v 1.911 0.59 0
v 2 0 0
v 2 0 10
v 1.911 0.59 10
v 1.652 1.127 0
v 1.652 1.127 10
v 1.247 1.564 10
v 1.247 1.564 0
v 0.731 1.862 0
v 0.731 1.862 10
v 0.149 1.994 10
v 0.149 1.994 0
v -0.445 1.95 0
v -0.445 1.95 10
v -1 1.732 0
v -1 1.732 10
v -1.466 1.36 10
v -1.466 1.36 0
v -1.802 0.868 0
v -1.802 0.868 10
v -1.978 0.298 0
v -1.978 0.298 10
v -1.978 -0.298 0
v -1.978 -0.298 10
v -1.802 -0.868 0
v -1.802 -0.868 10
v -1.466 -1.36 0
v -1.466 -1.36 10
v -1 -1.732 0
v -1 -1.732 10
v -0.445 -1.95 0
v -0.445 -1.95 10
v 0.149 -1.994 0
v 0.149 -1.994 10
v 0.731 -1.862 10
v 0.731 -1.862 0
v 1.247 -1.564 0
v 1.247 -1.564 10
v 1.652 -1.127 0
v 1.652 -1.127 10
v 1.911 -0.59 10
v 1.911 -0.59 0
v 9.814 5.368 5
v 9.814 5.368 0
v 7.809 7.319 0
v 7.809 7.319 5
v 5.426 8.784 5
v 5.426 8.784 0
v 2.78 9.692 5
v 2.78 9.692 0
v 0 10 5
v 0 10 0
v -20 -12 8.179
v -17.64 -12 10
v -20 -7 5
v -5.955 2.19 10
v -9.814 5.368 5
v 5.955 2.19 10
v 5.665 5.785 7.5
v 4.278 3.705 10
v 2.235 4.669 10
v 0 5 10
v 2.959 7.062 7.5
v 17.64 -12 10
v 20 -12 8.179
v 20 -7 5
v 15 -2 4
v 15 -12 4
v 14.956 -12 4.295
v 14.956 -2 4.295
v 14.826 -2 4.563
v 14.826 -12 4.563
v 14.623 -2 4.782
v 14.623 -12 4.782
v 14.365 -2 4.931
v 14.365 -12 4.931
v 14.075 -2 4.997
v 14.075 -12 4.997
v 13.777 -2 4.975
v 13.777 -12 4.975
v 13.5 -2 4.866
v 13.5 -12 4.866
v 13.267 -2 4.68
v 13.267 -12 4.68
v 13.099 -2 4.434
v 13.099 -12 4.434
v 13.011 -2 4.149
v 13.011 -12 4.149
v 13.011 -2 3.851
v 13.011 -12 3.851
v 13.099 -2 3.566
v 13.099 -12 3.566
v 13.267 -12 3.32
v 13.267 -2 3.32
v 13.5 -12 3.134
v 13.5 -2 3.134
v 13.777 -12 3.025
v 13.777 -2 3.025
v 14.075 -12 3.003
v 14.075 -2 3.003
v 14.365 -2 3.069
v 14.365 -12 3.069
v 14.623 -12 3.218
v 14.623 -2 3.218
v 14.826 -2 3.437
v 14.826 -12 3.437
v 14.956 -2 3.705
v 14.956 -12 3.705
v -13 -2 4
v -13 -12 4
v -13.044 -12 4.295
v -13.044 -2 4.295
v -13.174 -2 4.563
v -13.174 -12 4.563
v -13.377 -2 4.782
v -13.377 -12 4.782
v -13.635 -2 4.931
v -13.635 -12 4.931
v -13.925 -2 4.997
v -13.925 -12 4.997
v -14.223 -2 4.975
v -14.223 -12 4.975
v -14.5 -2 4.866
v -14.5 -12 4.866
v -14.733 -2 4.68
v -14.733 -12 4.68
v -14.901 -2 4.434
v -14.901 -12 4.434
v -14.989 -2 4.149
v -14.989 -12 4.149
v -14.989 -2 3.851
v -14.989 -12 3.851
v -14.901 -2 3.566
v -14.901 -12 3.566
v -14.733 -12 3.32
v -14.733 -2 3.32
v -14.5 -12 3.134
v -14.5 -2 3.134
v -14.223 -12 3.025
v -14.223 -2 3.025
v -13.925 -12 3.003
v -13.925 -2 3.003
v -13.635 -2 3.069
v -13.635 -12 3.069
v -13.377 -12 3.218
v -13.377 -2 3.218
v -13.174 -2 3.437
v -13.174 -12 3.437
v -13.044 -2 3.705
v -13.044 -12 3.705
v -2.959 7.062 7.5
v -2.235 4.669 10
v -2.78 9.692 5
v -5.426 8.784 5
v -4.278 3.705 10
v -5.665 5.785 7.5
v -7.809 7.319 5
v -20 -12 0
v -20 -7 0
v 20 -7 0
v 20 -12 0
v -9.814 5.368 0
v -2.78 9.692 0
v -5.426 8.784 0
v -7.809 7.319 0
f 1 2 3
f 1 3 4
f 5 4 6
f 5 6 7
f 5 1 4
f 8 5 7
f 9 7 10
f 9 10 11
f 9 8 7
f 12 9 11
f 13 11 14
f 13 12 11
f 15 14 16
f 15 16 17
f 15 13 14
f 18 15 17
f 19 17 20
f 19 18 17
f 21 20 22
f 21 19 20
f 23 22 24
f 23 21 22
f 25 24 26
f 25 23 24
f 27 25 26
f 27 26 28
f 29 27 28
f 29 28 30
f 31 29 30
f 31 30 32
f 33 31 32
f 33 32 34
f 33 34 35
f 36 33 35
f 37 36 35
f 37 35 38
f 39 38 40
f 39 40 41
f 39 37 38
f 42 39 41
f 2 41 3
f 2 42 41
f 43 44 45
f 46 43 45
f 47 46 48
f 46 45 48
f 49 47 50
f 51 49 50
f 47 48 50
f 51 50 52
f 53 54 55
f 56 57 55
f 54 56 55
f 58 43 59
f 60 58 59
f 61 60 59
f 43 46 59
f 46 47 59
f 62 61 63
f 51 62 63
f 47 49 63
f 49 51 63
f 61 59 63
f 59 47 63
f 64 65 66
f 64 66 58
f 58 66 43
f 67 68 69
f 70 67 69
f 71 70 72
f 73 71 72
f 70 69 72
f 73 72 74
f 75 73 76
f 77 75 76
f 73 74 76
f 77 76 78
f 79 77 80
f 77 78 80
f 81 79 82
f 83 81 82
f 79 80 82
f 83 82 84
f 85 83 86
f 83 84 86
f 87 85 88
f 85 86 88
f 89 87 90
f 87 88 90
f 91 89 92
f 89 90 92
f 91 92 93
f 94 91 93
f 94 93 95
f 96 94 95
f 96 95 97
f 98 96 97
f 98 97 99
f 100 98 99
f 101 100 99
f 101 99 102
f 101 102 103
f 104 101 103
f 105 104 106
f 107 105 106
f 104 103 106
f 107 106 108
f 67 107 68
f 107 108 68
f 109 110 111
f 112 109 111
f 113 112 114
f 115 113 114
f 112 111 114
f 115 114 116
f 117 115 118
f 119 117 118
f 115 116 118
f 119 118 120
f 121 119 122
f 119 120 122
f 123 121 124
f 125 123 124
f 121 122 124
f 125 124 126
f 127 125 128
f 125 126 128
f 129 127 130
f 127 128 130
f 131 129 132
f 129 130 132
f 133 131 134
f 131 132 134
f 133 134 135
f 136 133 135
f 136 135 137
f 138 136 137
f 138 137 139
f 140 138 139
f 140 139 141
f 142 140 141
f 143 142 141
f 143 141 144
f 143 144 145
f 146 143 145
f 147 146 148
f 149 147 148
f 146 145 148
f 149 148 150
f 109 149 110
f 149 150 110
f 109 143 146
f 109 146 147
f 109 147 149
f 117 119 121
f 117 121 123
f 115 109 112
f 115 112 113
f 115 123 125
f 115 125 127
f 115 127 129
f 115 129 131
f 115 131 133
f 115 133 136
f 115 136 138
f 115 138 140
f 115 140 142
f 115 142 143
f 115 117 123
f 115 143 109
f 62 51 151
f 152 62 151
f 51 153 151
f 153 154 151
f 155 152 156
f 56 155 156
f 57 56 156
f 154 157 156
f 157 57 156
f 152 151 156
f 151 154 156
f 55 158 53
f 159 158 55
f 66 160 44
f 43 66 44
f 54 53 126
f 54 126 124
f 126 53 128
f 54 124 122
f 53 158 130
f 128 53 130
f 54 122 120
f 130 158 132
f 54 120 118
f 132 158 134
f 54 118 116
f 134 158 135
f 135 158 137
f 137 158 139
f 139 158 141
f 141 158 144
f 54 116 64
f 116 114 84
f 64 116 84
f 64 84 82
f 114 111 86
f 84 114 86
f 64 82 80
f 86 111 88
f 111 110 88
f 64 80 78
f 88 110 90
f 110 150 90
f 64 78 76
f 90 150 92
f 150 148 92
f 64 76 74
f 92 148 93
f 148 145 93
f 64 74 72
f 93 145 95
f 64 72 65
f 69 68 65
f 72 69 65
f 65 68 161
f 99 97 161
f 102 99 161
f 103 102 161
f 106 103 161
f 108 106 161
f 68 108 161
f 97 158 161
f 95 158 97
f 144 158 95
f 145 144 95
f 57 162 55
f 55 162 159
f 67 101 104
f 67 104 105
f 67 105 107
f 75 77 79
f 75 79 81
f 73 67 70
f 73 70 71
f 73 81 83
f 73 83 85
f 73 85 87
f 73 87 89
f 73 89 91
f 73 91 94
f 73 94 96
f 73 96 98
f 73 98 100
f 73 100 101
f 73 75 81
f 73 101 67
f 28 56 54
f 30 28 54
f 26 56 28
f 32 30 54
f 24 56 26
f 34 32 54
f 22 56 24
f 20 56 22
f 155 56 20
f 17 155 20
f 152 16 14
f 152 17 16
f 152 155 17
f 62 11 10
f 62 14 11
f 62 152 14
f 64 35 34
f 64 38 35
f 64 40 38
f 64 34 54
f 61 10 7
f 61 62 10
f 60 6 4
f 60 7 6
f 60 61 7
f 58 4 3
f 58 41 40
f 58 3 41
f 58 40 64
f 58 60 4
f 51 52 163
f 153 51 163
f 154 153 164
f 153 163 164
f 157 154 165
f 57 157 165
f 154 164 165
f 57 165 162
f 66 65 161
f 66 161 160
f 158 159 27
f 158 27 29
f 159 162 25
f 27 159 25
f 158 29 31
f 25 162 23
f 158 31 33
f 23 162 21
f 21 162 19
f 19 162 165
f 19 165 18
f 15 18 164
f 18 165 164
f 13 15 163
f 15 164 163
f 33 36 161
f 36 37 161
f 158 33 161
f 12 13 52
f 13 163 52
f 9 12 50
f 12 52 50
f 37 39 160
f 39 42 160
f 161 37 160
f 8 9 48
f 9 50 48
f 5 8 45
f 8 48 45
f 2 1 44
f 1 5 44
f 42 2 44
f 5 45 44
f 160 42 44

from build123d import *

# Parameters (mm, degrees)
F0_W     = 40
F0_H     = 5
F0_R     = 2
F1_DEPTH = 10
F2_R     = 1
F3_DEPTH = 10
F4_SIZE  = 5


with BuildPart() as f1:
    # F0 (on Top) → F1 (new body)
    with BuildSketch(Plane.XY):
        with Locations((0, -9.5)):
            Rectangle(F0_W, F0_H)
        with BuildLine():
            Line((-9.814244, 5.368419), (-20, -7))
            Line((-20, -7), (20, -7))
            Line((20, -7), (9.814244, 5.368419))
            ThreePointArc((9.814244, 5.368419), (5.426116, 8.783949), (0, 10))
            ThreePointArc((0, 10), (-5.426116, 8.783949), (-9.814244, 5.368419))
        make_face()
        Circle(F0_R, mode=Mode.SUBTRACT)
    extrude(amount=F1_DEPTH)

    # F2 (on face) → F3 (cut)
    with BuildSketch(Plane.XZ.offset(12)):
        with Locations((-14, 4)):
            Circle(F2_R)
        with Locations((14, 4)):
            Circle(F2_R)
    extrude(amount=-F3_DEPTH, mode=Mode.SUBTRACT)

    # F4
    f4_edges = [f1.edges().sort_by_distance(p)[0] for p in [
        (14.907122, -0.815791, 10),
    ]]
    chamfer(f4_edges, length=F4_SIZE)


solid = f1.part
